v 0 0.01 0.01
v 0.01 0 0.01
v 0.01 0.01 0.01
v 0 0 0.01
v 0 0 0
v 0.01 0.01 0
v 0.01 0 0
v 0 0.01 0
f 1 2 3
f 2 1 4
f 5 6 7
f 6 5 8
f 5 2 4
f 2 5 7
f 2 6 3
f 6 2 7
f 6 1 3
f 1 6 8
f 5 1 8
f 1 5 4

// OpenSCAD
// file: key_half.scad
// umote case v5: key half (button board + battery) body and face panel. Assembled = model coordinates.

batt_end = batt_y0 + batt[1];
y_inner_end = L - wall;
bz_top = 6.0;                       // the floor is solid up to here past the battery (bottom zone)
pad_x = 3.5;  pad_z = 7.9;          // brass-insert contact pads in the bottom end
dmag_x = 11;  dmag_z = 7.9;         // dock magnets in the bottom end wall (axis along y)
end_block_y = 212.6;
eye = [-20.0, 212.0, 9.0];          // strap eyelet: holes meet here
clip_y = [bb_y0 + 20, bb_y0 + 100];  clip_w = 6;
stop_y = bb_y0 + bb_l + 0.1;
key_snaps = [[22.3, 198.0, 0], [22.3, 205.0, 0], [-22.3, 198.0, 180], [-22.3, 205.0, 180]];   // releasable, as the head's side snaps; clear of the eyelet pillar
door_y1 = batt_end + 0.3;           // the battery door window's bottom end (the bottom zone's floor is solid)


module key_cavity() { union() {
  translate([0, 0, floor_t]) linear_extrude(roll_z - floor_t + 0.01) plan(wall);
  stack(roll_z, T + 0.01, 8, 1.8);
} }
// a hole along y whose section points up (+z): horizontal holes in a back-down print
module td_y(d, y0, y1) translate([0, y0, 0]) rotate([-90, 0, 0]) linear_extrude(y1 - y0)
  polygon(concat([for (k = [0 : 23]) let(t = -38.7 + 257.4 * k / 23) [d / 2 * cos(t), d / 2 * sin(t)]], [[0, -d / 2 * 1.6]]));
module td_x(d, x0, x1) translate([x0, 0, 0]) rotate([0, 90, 0]) linear_extrude(x1 - x0)
  polygon(concat([for (k = [0 : 23]) let(t = 231.3 + 257.4 * k / 23) [d / 2 * cos(t), d / 2 * sin(t)]], [[-d / 2 * 1.6, 0]]));

module key_body() { difference() {
  union() {
    difference() { ycut(y_key_start, L + 1) envelope(); key_cavity(); panel_zone(0); }
    intersection() { ycut(y_key_start, L + 1) translate([0, 0, -1]) linear_extrude(T) plan(wall - 0.01);
      union() {
        translate([-30, batt_end + 0.5, floor_t - 0.01]) cube([60, 20, bz_top - floor_t]);            // bottom-zone floor
        translate([-17, end_block_y, bz_top - 0.01]) cube([34, 10, 13.4 - bz_top]);                    // end block: pads + magnets
        translate([-30, 208.5, bz_top - 0.01]) cube([30 - 17.5, 10, 12 - bz_top]);                     // eyelet pillar (-x corner)
      } }
    prongs(y_key_start, -1);
  }
  door_window();
  for (s = key_snaps) translate([s[0], s[1], snap_root_z]) rotate(s[2]) catch(gap = 0.6);
  for (sx = [-1, 1]) {
    translate([sx * pad_x, 0, pad_z]) { td_y(pad_insert[0], L - pad_insert[1], L + 1); td_y(2.0, end_block_y - 1, L - pad_insert[1] + 0.1); }
    translate([sx * dmag_x, 0, dmag_z]) intersection() { td_y(magnet[0] + 0.2, end_block_y - 0.1, L - 0.6 - (L - y_inner_end - 2.2));
      translate([-10, end_block_y - 1, 0]) cube([20, 10, 13.6 - dmag_z]); translate([-10, end_block_y - 1, -10]) cube([20, 10, 30]); }
  }
  translate([0, 0, eye[2]]) { translate([0, eye[1], 0]) td_x(2.2, -W, eye[0] + 1.1); translate([eye[0], 0, 0]) td_y(2.2, eye[1] - 1.1, L + 2); }
} }

// battery door window through the back: 46.6 wide, so the battery goes in from the back
door_w = batt[0] + 0.6;
module door2d(grow = 0.15) translate([-door_w / 2 - grow, y_key_start - 1]) square([door_w + 2 * grow, door_y1 - y_key_start + 1 + grow]);
module door_window() translate([0, 0, -1]) linear_extrude(floor_t + 1.01) door2d();

// ---------- key face panel ----------
module key_face_cuts() {
  translate(concat(dc, [pz0 - 1])) cylinder(r = acc_out + 0.1, h = pan_t + 2, $fn = 192);      // D-pad + ring
  translate(concat(dc, [pz0 - 0.01])) cylinder(r = acc_out + 1.3, h = 0.86, $fn = 192);        // ring flange pocket
  for (k = round_keys) translate(concat(bpos(singles[k]), [pz0 - 3])) {
    cylinder(d = cap_hole, h = 10);
    translate([-(rib_w + 2 * rib_clr) / 2, -(cap_d / 2 + rib_out + rib_clr), 0]) cube([rib_w + 2 * rib_clr, cap_d / 2, 3 + pan_t - rib_skin]);
    translate([0, 0, pan_t + 3 - 0.4]) cylinder(d1 = cap_hole, d2 = cap_hole + 0.81, h = 0.41);
  }
  for (p = [vol, ch]) {
    translate([0, 0, pz0 - 1]) linear_extrude(pan_t + 2) capsule2d(p, cap_hole);
    translate([0, 0, T - 0.4]) hull() { linear_extrude(0.01) capsule2d(p, cap_hole); translate([0, 0, 0.41]) linear_extrude(0.01) capsule2d(p, cap_hole + 0.81); }
  }
  for (dx = [-1.6 : 1.6 : 1.6]) translate(concat(bpos(mic_b) + [dx, 0], [pz0 - 1])) hull() for (dy = [-0.9, 0.9]) translate([0, dy, 0]) cylinder(d = 0.9, h = pan_t + 2, $fn = 16);
  // key groups: 0.8 x 0.4 V-grooves round the nav and media groups
  for (g = [0, 1]) difference() {            // a true V: both walls meet at offset 0.4, 0.4 deep
    hull() { translate([0, 0, T - 0.4]) linear_extrude(0.01) group2d(g, 0.4); translate([0, 0, T]) linear_extrude(0.02) group2d(g, 0.75); }   // 41 deg walls
    hull() { translate([0, 0, T - 0.41]) linear_extrude(0.01) group2d(g, 0.4); translate([0, 0, T + 0.01]) linear_extrude(0.02) group2d(g, 0.05); }
  }
}
module group2d(g, grow) offset(delta = grow) {
  if (g == 0) hull() { translate(dc) circle(r = acc_out + 2.2, $fn = 128); for (k = [1, 3]) translate(bpos(singles[k])) circle(d = cap_hole + 3.4); }
  else offset(r = 2.0) hull() { capsule2d(vol, cap_hole); capsule2d(ch, cap_hole); }
}
// cap flange collars under the face (v4): round keys keyed, rockers in capsule pockets
module key_collars() translate([0, 0, pz0 - cap_flange - 0.4]) linear_extrude(cap_flange + 0.45) difference() {
  union() {
    for (k = round_keys) translate(bpos(singles[k])) circle(d = flange_d + 2 * flange_clr + 2.4);
    for (p = [vol, ch]) capsule2d(p, flange_d + 2 * flange_clr + 2.4);
  }
  for (k = round_keys) translate(bpos(singles[k])) circle(d = flange_d + 2 * flange_clr);
  for (p = [vol, ch]) capsule2d(p, flange_d + 2 * flange_clr);
}
// board clips: beams beside the board's long edges, hooks under it (45 deg both faces)
module board_clip() {
  len = pz0 - bb_z0 + 0.5;
  translate([0, -clip_w / 2, 0]) rotate([90, 0, 0]) mirror([0, 0, 1]) linear_extrude(clip_w)
    polygon([[0, 0], [1.0, 0], [1.0, -len], [-0.6, -len + 0.0], [-0.6, -len + 0.5], [0, -len + 1.1]]);
}
module key_panel() { difference() {
  union() {
    intersection() { panel_zone(pcl); translate([-50, y_key_start, 0]) cube([100, L, 30]); }
    intersection() { key_collars(); translate([-50, y_key_start + 0.2, 0]) cube([100, L, 30]); }
    for (y = clip_y) for (sx = [-1, 1]) mirror([sx > 0 ? 0 : 1, 0, 0]) translate([bb_w / 2 + 0.1, y, pz0 + 0.01]) board_clip();
    for (sx = [-1, 1]) translate([sx * 6 - 3, stop_y, bb_z0 + 0.5]) cube([6, 1.5, pz0 - bb_z0 - 0.45]);      // bottom stops
    for (s = key_snaps) translate([s[0], s[1], snap_root_z + 0.01]) rotate(s[2]) snap(gap = 0.6);
    for (sx = [-1, 1]) translate([sx * tongue_x - tongue[0] / 2, 0, 0]) rotate([90, 0, 90]) linear_extrude(tongue[0]) key_tongue2d(0);
  }
  key_face_cuts();
} }
// file: keys.scad
// umote case v5: key geometry shared by the key panel and the caps (v4's D-pad ring and sectors,
// plus the v5 rockers). Caps themselves come in Task 8.
module ring2d(grow = 0) {
  difference() {
    circle(r = ring_out + grow, $fn = 192);
    circle(r = ring_in - grow, $fn = 128);
    for (a = [45 : 90 : 315]) rotate(a) translate([0, -(ring_web / 2 - grow)]) square([ring_out + 5, ring_web - 2 * grow]);
  }
}
module sector2d(i, grow = 0) {       // i: 0 left(+x), 1 down(+y), 2 right(-x), 3 up(-y)
  intersection() {
    ring2d(grow);
    rotate(i * 90) polygon([[0, 0], [40, -40], [40, 40]]);
  }
}

module capsule2d(p, d) { hull() for (q = p) translate(q) circle(d = d, $fn = 48); }
round_keys = [0, 1, 2, 3, 6];       // POWER BACK HOME VOICE MUTE keep v4's round caps
vol = [bpos(singles[4]), bpos(singles[5])];  ch = [bpos(singles[7]), bpos(singles[8])];
acc_in = ring_out;  acc_out = ring_out + 1.5;      // D-pad ring (accent part): the opening's rim
// file: head_half.scad
// umote case v5: head (screen half) body and face panel, modelled straight (head_xf() bends them).

// ---------- releasable snap: a beam hanging from the panel's underside ----------
// Local frame: x = 0 is the beam's outer face (towards the wall), the root is at z = 0 (the panel
// underside), the beam hangs down -z, w runs along y. The hook reaches across the free gap to the
// wall and into it by uc. Both hook faces are 45 deg: lifting the panel cams it out (pry release),
// and both print without support (beam up, panel face down).
snap_beam = 3.9;                    // z room above the display PCB at the tip end
module snap(uc = snap_uc, gap = 0.4, len = snap_beam, w = snap_w, t = [1.0, 0.8]) {
  p = gap + uc;                     // hook protrusion past the beam
  zt = -len + 2 * p + 0.2;          // top of the hook's retention face
  translate([0, -w / 2, 0]) rotate([90, 0, 0]) mirror([0, 0, 1]) linear_extrude(w)
    polygon([[-t[0], 0], [0, 0], [0, zt], [p, zt - p], [p, zt - p - 0.2], [0, -len], [-t[1], -len]]);
}
// the matching pocket, same frame. It is cut from the beam's face (x = 0): above roll_z the wall
// rolls in, so its inner face is nearer than gap at the hook's height.
module catch(uc = snap_uc, gap = 0.4, len = snap_beam, w = snap_w) {
  p = gap + uc;  zt = -len + 2 * p + 0.2;
  translate([0, -(w + 0.6) / 2, 0]) rotate([90, 0, 0]) mirror([0, 0, 1]) linear_extrude(w + 0.6)
    polygon([[-0.01, zt + 0.1 + gap], [p + 0.15, zt - p - 0.05], [p + 0.15, zt - p - 0.35], [-0.01, -len - 0.35 - gap]]);
}
// where the 4 snaps sit (straight head coordinates): [x, y, rotation about z]; the beam's outer
// face points along the rotated +x. Two on the tip wall (beside the IR clips, outside the USB-end
// screw heads), one on each side wall near the tip.
snap_root_z = pz0;
tip_snap_y = 2.9;                    // beam outer face: clear of the rolled tip wall at the root (2.82 at z 14.2)
side_snap_x = 22.3;                  // beam outer face; inner face 21.3 (the LCD starts at y 10.5, the snaps sit at y 6)
snaps = [[ 17.5, tip_snap_y, -90], [-17.5, tip_snap_y, -90],
         [ side_snap_x, 6.0, 0], [-side_snap_x, 6.0, 180]];

// the hollow inside the head body: straight walls up to roll_z, then following the upper roll
module head_cavity() { intersection() {
  union() {
    translate([0, 0, floor_t]) linear_extrude(roll_z - floor_t + 0.01) plan(wall);
    stack(roll_z, T + 0.01, 8, 1.8);
  }
  translate([-50, tip_wall, -1]) cube([100, L, 30]);
} }

// ---------- head body ----------
// prongs: blocks merged into the side walls that reach prong[1] into the collar and sit on its
// thickened floor; an M2 from the back (under the magnet plate) threads up into each
prong_x = 19.5;  prong = [5.7, 4.0, 4.3];    // [x width from 17.8 to the wall, y reach, z height]
module prongs(y0, dir) {                     // dir +1: reach +y from y0 (head), -1: reach -y (key)
  zb = floor_t + 1.8;
  for (sx = [-1, 1]) mirror([sx > 0 ? 0 : 1, 0, 0]) translate([17.8, dir > 0 ? y0 - 1 : y0 - prong[1], zb]) difference() {
    union() {
      translate([0, dir > 0 ? 0 : prong[1], 0]) cube([in_w / 2 - 17.8 + 0.5, 1, prong[2]]);      // root, into the own wall
      translate([0, dir > 0 ? 1 : 0, 0]) cube([in_w / 2 - 17.8 - 0.1, prong[1], prong[2]]);       // reach, inside the collar
    }
    translate([prong_x - 17.8, dir > 0 ? prong[1] / 2 + 1 : prong[1] / 2, -1]) cylinder(d = 1.7, h = prong[2] - 0.6, $fn = 24);
  }
}
uz = db_z0 - usb_body_h / 2;
// rounded rectangle whose top (+y) corners are 45 deg chamfers instead: the top edge of an opening
// faces down when the body prints back down. flip = true chamfers the bottom instead (a boss's underside).
module rrc2d_up(w, h, r) polygon(concat(
  [for (k = [0 : 8]) let(t = 180 + 90 * k / 8) [-w / 2 + r + r * cos(t), -h / 2 + r + r * sin(t)]],
  [for (k = [0 : 8]) let(t = 270 + 90 * k / 8) [w / 2 - r + r * cos(t), -h / 2 + r + r * sin(t)]],
  [[w / 2, h / 2 - r], [w / 2 - r, h / 2], [-w / 2 + r, h / 2], [-w / 2, h / 2 - r]]));
module rrc2d(w, h, r, flip = false) { if (flip) mirror([0, 1]) rrc2d_up(w, h, r); else rrc2d_up(w, h, r); }
module usb_cuts() {                           // v4's notch: trapezoid round the plug, skin floor, receptacle hole
  ux = usb_floor * tan(usb_flare);
  translate([usb_x, 0, uz]) rotate([-90, 0, 0]) hull() {
    translate([0, 0, -1]) linear_extrude(1) rrc2d(usb_w + 2 * ux, usb_h, usb_r, true);
    linear_extrude(usb_floor) rrc2d(usb_w, usb_h, usb_r, true);
  }
  translate([usb_x, usb_floor - 0.5, db_z0 - usb_hole[1] / 2]) rotate([-90, 0, 0]) linear_extrude(usb_skin + 2) rrc2d(usb_hole[0], usb_hole[1], usb_hole[2], true);
}
module usb_skin_block() translate([usb_x, tip_wall - 0.01, uz]) rotate([-90, 0, 0])
  linear_extrude(usb_floor + usb_skin - tip_wall + 0.01) rrc2d(usb_w + 2, usb_h + 2, usb_r + 1);
// IR LED: tilted theta down at the tip, so the beam is level when the key half is (the head is bent up)
module ir_xf(sx) translate([sx * ir_x, tip_wall, ir_z]) rotate([theta, 0, 0]) translate([0, -tip_wall, 0]) children();
module ir_slot() for (sx = [-1, 1]) ir_xf(sx)            // dome pocket behind a skin, open to the top for the panel's clip
  translate([0, ir_skin, 0]) rotate([-90, 0, 0]) linear_extrude(tip_wall + 6) hull() { circle(d = 3.15, $fn = 32); translate([-1.575, -8]) square([3.15, 0.01]); }
module head_posts() for (h = holes) translate([h[0], h[1], floor_t - 0.01]) difference() {
  cylinder(d = h[1] < db_y0 + db_l / 2 ? 4.6 : 5.2, h = db_z0 - floor_t + 0.01, $fn = 40);
  translate([0, 0, 1]) cylinder(d = 2.1, h = 20, $fn = 24);
}
module head_body() { difference() {
  union() {
    difference() { ycut(-1, y_head_end) envelope(); head_cavity(); panel_zone(0); }
    intersection() { ycut(-1, y_head_end) translate([0, 0, floor_t]) linear_extrude(T) plan(wall - 0.01);
      union() { usb_skin_block(); head_posts(); } }
    prongs(y_head_end, 1);
  }
  usb_cuts(); ir_slot();
  for (s = snaps) translate([s[0], s[1], snap_root_z]) rotate(s[2]) catch(gap = abs(s[2]) == 90 ? tip_snap_y - tip_wall : 0.6);
  // IR LED wire groove down the -x side wall, from the LED's level to below the display PCB
  translate([-in_w / 2 - ir_wire[2], ir_wire[0], eb]) cube([ir_wire[2] + 0.01, ir_wire[1], roll_z - eb + 1]);
} }

// ---------- head face panel ----------
lip = 1.2;                                   // collar lip over the panel's collar edge (45 deg)
module ir_clips() for (sx = [-1, 1]) intersection() {   // v4's C saddles, tilted with the LEDs
  ir_xf(sx) difference() {
    translate([-2.4, tip_wall - 0.05, -0.6]) cube([4.8, 5.0, 6]);
    translate([0, tip_wall - 1, 0]) rotate([-90, 0, 0]) cylinder(d = 3.1, h = 7, $fn = 32);
    translate([-1.3, tip_wall - 1, -3]) cube([2.6, 7, 3]);
  }
  translate([-50, 0, 0]) cube([100, 50, pz0 + 0.05]);
  translate([0, 0.15, -0.01]) union() { head_cavity(); translate([0, 0, pz0]) linear_extrude(1) plan(wall); }   // stays inside, 0.15 off the tip wall
}
module head_panel() { difference() {
  union() {
    intersection() { panel_zone(pcl); translate([-50, -1, 0]) cube([100, y_head_end + 1, 30]); }
    for (s = snaps) translate([s[0], s[1], snap_root_z + 0.01]) rotate(s[2]) snap(gap = abs(s[2]) == 90 ? tip_snap_y - tip_wall : 0.6);
    ir_clips();
  }
  // screen window + 45 deg bezel (v4)
  translate([0, win_y0 + win_l / 2, pz0 - 0.5]) linear_extrude(pan_t + 1) rr2d(win_w, win_l, win_r);
  translate([0, win_y0 + win_l / 2, T - win_cham]) hull() {
    linear_extrude(0.01) rr2d(win_w, win_l, win_r);
    translate([0, 0, win_cham + 0.01]) linear_extrude(0.01) rr2d(win_w + 2 * win_cham, win_l + 2 * win_cham, win_r + win_cham);
  }
  // the collar edge: 45 deg chamfer from the face under the collar's lip
  translate([-50, 0, 0]) rotate([90, 0, 90]) linear_extrude(100)
    polygon([[y_head_end - lip, T + 0.01], [y_head_end + 1, T + 0.01], [y_head_end + 1, T - lip - 1], [y_head_end + 0.01, T - lip - 1], [y_head_end + 0.01, T - lip]]);
} }
// file: profile.scad
// umote case v5: the outer form only (plan outline, cross-section, bend). Include after params.scad.

module base2d() { hull() {
  for (sx = [-1, 1]) translate([sx * (W / 2 - tip_r), tip_r]) circle(r = tip_r);
  for (sx = [-1, 1]) translate([sx * (W / 2 - corner_r), L - corner_r]) circle(r = corner_r);
} }
module plan(i = 0) { if (i == 0) base2d(); else offset(r = -i) base2d(); }   // negative i grows it
module rr2d(w, l, r) { offset(r = r) square([w - 2 * r, l - 2 * r], center = true); }

// plan inset of the outer surface at height z: a 45 deg foot, the lower quarter ellipse into the
// flat back, the straight band, then the upper roll round the face panel
function e_in(z) = z < bed_ch ? 1.82 + 0.9 * (bed_ch - z)        // 42 deg, just under the 45 deg limit
  : z < eb ? ea * (1 - sqrt(1 - pow((eb - z) / eb, 2)))
  : z < roll_z ? 0 : roll * pow((z - roll_z) / (T - roll_z), 2);

// one hull between two plan slices; a stack of them follows e_in() (each band is convex)
module slab(z0, z1, i0, i1) { hull() {
  translate([0, 0, z0]) linear_extrude(0.01) plan(i0);
  translate([0, 0, z1 - 0.01]) linear_extrude(0.01) plan(i1);
} }
module stack(z0, z1, n, extra = 0) {
  for (k = [0 : n - 1]) { a = z0 + (z1 - z0) * k / n; b = z0 + (z1 - z0) * (k + 1) / n;
    slab(a, b, e_in(a) + extra, e_in(b) + extra); }
}
module envelope() { union() {
  slab(0, bed_ch, e_in(0), e_in(bed_ch));
  stack(bed_ch, eb, 12);
  slab(eb, roll_z, 0, 0);
  stack(roll_z, T, 10);
} }
// the face-panel opening: the envelope's roll moved in by the land
module panel_zone(extra = 0) { stack(pz0, T + 0.01, 4, land + extra); }

// the bend: the head turns theta about a transverse axis on the face at the head end, face concave
module head_xf() { translate([0, y_head_end, T]) rotate([-theta, 0, 0]) translate([0, -y_head_end, -T]) children(); }
module ycut(y0, y1) { intersection() { children(); translate([-60, y0, -20]) cube([120, y1 - y0, 60]); } }
// main file
// umote case v5: part dispatcher. Print parts come out in print orientation; asm_* parts are in
// model (assembled) coordinates for the fit check and viewer.
// Render: openscad -D 'part="key_body"' -o key_body.stl case/v5/umote_v5.scad   (or case/v5/export.sh)
part = "params";
$fn = 64;
include <params.scad>
include <profile.scad>
include <head_half.scad>
include <collar.scad>
include <keys.scad>
include <key_half.scad>

// every value the checks need, as one JSON line
P = [["W", W], ["wall", wall], ["tip_wall", tip_wall], ["T", T], ["L", L], ["theta", theta], ["clr", clr],
  ["board_gap", board_gap], ["usb_x", usb_x], ["usb_in", usb_in], ["usb_body_h", usb_body_h], ["usb_floor", usb_floor],
  ["db_w", db_w], ["db_l", db_l], ["db_pcb", db_pcb], ["db_front", db_front], ["db_back", db_back], ["db_y0", db_y0],
  ["db_end", db_end], ["db_top", db_top], ["db_z0", db_z0], ["lcd_from_ant", lcd_from_ant], ["lcd_l", lcd_l],
  ["bb_w", bb_w], ["bb_l", bb_l], ["bb_pcb", bb_pcb], ["bb_y0", bb_y0], ["bb_z0", bb_z0], ["bb_top", bb_top],
  ["sw_body", sw_body], ["sw_total", sw_total], ["smd_h", smd_h], ["top_parts", top_parts],
  ["batt", batt], ["batt_y0", batt_y0], ["batt_z0", batt_z0], ["floor_t", floor_t],
  ["ir_x", ir_x], ["ir_z", ir_z], ["front_in", front_in], ["pan_t", pan_t], ["land", land], ["pcl", pcl],
  ["y_head_end", y_head_end], ["y_key_start", y_key_start], ["cy", cy], ["axle_z", axle_z],
  ["whl_d", whl_d], ["whl_w", whl_w], ["whl_proud", whl_proud], ["ec11", ec11], ["tact", tact],
  ["cradle_travel", cradle_travel], ["fork_x", fork_x], ["fork_y", fork_y], ["key_tongue", key_tongue],
  ["magnet", magnet], ["pad_insert", pad_insert], ["pogo_d", pogo_d], ["pogo_l", pogo_l], ["snap_uc", snap_uc], ["tact_c", tact_c], ["piv", piv]];
function jv(v) = is_list(v) ? str("[", jl(v, 0), "]") : str(v);
function jl(v, i) = i >= len(v) ? "" : str(jv(v[i]), i < len(v) - 1 ? "," : "", jl(v, i + 1));
function jo(p, i) = i >= len(p) ? "" : str("\"", p[i][0], "\":", jv(p[i][1]), i < len(p) - 1 ? "," : "", jo(p, i + 1));

if (part == "params") { echo(str("PARAMS {", jo(P, 0), "}")); cube(0.01); }
else if (part == "envelope") envelope();
else if (part == "envelope_bent") union() { ycut(y_key_start, L + 1) envelope(); head_xf() ycut(-1, y_head_end) envelope(); }
else if (part == "snap_test") snap_test();
else if (part == "roller_test") roller_test();
else if (part == "head_body") head_body();
else if (part == "head_panel") translate([0, 0, T]) mirror([0, 0, 1]) head_panel();
else if (part == "asm_head_body") head_xf() head_body();
else if (part == "asm_head_panel") head_xf() head_panel();
else if (part == "key_body") key_body();
else if (part == "key_panel") translate([0, 0, T]) mirror([0, 0, 1]) key_panel();
else if (part == "asm_key_body") key_body();
else if (part == "asm_key_panel") key_panel();
else if (part == "asm_collar_core") collar_core();
else if (part == "asm_collar") collar();
else if (part == "collar") collar_print() collar();
else if (part == "wheel") wheel_flat();
else if (part == "cradle") translate([0, 0, -cr_z0]) cradle();
else if (part == "asm_cradle_pressed") pressed() cradle();
else if (part == "asm_wheel_pressed") pressed() translate([whl_x, cy, axle_z]) wheel();
else if (part == "asm_wheel") translate([whl_x, cy, axle_z]) wheel();
else if (part == "asm_cradle") cradle();
else if (part == "asm_ec11") ec11_envelope();
else assert(false, str("unknown part ", part));

// ---------- test prints ----------
// snap_test: the head's tip corner (back down) and the panel's tip corner (face down), side by side.
// Tip-wall snaps with undercuts 0.3 / 0.4 / 0.5 (1 / 2 / 3 dots inside the panel) and one side-wall snap (0.4).
st_uc = [0.3, 0.4, 0.5];  st_x = [4, 10.5, 17];
module st_box() { translate([-3, -1, -1]) cube([29.5, 15, 30]); }
module snap_test() {
  intersection() { st_box(); difference() {
    envelope(); head_cavity(); panel_zone(0);
    for (i = [0 : 2]) translate([st_x[i], tip_snap_y, snap_root_z]) rotate(-90) catch(st_uc[i], gap = tip_snap_y - tip_wall);
    translate([side_snap_x, 6.0, snap_root_z]) catch(0.4, gap = 0.6);
  } }
  translate([0, 40, T]) mirror([0, 0, 1]) difference() {
    union() {
      intersection() { st_box(); panel_zone(pcl); }
      for (i = [0 : 2]) translate([st_x[i], tip_snap_y, snap_root_z]) rotate(-90) snap(st_uc[i], gap = tip_snap_y - tip_wall);
      translate([side_snap_x, 6.0, snap_root_z]) snap(0.4, gap = 0.6);
    }
    for (i = [0 : 2]) for (k = [0 : i]) translate([st_x[i] - 2 + k * 1.6, 9, pz0 - 0.1]) cylinder(d = 0.9, h = 0.5, $fn = 16);
  }
}
// roller_test: the collar without its fork and slots (standing on its key face), the wheel and the cradle.
// the collar prints standing on its key-side face (assembled +y points down)
module collar_print() translate([0, 0, y_key_start]) rotate([-90, 0, 0]) children();
module wheel_flat() translate([0, 0, whl_w / 2]) rotate([0, 90, 0]) wheel();
module roller_test() {
  collar_print() collar_core();
  translate([0, 45, whl_w / 2]) rotate([0, 90, 0]) wheel();
  translate([0, 30 - 85, -cr_z0]) cradle();
}
